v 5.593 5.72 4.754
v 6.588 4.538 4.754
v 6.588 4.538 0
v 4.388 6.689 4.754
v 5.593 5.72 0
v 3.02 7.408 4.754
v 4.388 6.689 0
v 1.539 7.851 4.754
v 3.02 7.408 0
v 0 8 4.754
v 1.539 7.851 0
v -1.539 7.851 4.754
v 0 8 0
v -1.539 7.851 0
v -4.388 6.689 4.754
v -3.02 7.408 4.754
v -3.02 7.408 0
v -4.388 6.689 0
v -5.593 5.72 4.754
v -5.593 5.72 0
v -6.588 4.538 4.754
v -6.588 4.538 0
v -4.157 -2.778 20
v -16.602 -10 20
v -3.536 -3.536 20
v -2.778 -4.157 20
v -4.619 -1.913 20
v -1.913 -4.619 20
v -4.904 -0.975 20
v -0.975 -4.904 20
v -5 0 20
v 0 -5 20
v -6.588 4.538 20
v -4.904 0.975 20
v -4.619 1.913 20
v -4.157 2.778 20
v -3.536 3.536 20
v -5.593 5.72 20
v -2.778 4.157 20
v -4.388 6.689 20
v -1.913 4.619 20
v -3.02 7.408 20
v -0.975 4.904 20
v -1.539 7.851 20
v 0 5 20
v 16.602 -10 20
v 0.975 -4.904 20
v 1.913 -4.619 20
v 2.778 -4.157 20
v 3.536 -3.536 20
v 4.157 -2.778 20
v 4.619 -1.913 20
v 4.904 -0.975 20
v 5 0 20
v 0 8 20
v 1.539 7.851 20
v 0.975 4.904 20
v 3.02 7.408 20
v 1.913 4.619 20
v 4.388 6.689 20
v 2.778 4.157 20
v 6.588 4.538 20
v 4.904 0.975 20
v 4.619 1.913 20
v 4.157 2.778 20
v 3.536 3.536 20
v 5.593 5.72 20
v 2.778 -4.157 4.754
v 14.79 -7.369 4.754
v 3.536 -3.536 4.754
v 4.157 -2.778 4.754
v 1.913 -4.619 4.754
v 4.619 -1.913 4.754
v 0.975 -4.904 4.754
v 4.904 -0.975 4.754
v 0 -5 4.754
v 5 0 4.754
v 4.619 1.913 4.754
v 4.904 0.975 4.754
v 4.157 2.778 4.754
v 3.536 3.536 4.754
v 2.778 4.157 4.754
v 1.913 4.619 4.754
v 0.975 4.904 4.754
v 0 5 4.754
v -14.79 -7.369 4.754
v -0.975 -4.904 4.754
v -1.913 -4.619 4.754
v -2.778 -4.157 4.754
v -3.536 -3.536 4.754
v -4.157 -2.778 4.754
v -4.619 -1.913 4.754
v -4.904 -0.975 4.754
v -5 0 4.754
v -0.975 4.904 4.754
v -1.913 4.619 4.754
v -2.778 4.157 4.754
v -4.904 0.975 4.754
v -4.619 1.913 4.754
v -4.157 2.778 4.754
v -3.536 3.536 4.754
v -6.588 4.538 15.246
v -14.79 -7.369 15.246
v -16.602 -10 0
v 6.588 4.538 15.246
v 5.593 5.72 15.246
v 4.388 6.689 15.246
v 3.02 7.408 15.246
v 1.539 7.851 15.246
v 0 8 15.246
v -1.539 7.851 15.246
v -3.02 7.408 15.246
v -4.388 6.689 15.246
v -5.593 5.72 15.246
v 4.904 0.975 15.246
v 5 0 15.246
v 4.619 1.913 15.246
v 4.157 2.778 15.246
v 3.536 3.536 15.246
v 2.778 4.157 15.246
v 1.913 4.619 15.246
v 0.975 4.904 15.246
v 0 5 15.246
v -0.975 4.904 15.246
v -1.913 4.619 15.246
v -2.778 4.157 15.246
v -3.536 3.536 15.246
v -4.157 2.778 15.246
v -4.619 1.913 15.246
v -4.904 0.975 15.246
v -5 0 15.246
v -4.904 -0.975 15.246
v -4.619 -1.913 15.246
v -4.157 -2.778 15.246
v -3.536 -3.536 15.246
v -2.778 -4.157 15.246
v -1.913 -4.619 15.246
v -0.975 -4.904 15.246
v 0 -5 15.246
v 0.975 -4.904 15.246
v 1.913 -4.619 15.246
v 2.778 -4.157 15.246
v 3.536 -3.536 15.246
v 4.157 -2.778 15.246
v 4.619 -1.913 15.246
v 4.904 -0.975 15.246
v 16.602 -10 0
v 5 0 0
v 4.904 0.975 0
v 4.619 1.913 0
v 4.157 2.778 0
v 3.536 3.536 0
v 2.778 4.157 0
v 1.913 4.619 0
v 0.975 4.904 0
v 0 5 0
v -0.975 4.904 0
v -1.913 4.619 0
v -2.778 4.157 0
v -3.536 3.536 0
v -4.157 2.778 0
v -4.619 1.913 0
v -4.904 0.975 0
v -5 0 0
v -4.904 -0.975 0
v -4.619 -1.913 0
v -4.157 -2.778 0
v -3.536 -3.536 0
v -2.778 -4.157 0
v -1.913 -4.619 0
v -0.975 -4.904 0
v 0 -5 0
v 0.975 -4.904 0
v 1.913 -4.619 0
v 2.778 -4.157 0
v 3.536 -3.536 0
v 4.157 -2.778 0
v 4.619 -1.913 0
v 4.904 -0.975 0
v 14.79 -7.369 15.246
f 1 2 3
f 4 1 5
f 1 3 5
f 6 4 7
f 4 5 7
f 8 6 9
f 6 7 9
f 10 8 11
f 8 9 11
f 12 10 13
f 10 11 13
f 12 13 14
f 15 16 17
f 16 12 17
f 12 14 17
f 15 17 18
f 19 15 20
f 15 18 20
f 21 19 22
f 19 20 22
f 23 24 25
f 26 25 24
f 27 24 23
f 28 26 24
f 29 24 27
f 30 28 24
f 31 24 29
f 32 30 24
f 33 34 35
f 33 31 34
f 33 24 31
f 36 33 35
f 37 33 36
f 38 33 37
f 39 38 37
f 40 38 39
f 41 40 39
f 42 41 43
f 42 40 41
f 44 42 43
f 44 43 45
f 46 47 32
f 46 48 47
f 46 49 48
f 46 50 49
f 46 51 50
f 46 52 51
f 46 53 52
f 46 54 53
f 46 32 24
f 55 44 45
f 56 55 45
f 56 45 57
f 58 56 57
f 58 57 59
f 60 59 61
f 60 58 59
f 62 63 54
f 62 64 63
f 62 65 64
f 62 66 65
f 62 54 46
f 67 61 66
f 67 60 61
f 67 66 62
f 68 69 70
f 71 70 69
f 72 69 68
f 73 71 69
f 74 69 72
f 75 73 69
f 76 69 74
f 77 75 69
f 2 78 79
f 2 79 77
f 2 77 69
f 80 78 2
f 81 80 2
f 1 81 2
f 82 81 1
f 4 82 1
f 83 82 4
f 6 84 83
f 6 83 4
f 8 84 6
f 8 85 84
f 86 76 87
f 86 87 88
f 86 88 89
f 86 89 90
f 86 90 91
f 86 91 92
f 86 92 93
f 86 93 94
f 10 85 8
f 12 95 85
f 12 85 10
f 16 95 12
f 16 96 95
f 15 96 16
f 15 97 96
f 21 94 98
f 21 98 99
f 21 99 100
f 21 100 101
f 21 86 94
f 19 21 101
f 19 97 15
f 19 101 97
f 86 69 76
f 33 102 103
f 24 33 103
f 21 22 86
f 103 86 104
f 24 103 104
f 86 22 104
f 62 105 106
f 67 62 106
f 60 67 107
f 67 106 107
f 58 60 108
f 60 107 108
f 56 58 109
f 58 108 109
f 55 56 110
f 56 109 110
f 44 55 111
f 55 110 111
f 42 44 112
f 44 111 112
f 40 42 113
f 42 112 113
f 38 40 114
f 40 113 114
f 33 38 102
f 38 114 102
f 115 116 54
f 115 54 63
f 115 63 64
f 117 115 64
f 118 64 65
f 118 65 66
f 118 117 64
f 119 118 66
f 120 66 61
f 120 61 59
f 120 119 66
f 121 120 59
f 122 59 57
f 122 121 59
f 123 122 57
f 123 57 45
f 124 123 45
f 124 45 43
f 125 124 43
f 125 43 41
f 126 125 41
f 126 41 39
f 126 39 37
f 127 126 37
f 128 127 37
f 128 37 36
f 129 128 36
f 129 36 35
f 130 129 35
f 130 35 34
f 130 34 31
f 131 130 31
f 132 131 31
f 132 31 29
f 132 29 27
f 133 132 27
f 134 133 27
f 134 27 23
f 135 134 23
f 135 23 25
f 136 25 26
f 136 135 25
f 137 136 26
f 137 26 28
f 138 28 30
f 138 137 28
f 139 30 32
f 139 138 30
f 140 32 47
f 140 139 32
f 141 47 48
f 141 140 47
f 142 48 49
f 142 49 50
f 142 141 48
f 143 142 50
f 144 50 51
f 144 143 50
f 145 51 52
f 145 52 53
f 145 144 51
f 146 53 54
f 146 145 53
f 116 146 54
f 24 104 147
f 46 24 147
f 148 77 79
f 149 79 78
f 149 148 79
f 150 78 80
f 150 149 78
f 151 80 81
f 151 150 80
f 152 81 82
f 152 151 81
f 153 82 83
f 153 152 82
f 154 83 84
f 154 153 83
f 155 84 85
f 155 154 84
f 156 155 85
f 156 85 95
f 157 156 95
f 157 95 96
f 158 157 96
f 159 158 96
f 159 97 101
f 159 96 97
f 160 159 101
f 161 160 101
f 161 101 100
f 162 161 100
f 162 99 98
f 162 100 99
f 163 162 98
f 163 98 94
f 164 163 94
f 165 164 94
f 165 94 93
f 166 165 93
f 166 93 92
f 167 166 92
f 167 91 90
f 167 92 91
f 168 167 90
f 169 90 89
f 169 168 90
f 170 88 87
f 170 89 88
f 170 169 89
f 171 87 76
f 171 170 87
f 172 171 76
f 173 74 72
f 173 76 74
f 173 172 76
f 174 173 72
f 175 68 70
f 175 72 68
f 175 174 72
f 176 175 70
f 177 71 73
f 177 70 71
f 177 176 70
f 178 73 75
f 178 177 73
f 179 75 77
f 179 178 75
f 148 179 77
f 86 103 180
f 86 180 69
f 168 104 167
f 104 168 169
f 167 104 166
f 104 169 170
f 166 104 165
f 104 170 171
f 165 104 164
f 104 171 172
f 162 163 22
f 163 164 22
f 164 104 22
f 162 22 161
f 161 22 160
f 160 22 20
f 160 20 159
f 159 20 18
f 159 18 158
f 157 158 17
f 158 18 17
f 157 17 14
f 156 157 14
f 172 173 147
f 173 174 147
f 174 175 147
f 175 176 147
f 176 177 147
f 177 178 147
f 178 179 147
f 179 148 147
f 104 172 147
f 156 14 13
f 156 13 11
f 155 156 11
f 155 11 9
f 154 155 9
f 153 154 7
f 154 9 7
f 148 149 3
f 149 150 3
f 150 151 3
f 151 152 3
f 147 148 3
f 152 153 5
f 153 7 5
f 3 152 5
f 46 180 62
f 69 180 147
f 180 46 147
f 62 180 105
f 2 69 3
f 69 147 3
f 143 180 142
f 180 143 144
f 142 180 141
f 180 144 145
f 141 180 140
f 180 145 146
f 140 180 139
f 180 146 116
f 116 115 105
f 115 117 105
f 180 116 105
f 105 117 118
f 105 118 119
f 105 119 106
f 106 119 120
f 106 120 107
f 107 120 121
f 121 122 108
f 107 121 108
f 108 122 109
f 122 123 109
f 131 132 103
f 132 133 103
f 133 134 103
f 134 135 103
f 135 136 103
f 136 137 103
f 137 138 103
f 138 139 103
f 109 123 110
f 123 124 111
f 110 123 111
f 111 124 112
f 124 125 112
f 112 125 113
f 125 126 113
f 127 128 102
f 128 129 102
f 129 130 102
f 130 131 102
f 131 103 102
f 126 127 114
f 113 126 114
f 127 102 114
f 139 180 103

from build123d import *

# Parameters (mm, degrees)
SKETCH1_R               = 5
BOSS_EXTRUDE1_DEPTH     = 20
SKETCH2_W               = 10.491339254
SKETCH2_H               = 19.291026948
CUT_EXTRUDE1_DEPTH      = 17.60180745
CUT_EXTRUDE1_DEPTH_BACK = 17.60180745


with BuildPart() as part:
    # Sketch1 → Boss-Extrude1 (new body)
    with BuildSketch(Plane.XY):
        with BuildLine():
            Line((16.60180745, -10), (6.588404709, 4.537942638))
            ThreePointArc((6.588404709, 4.537942638), (0, 8), (-6.588404709, 4.537942638))
            Line((-6.588404709, 4.537942638), (-16.60180745, -10))
            Line((-16.60180745, -10), (16.60180745, -10))
        make_face()
        Circle(SKETCH1_R, mode=Mode.SUBTRACT)
    extrude(amount=BOSS_EXTRUDE1_DEPTH)

    # Sketch2 → Cut-Extrude1 (cut, two sides)
    with BuildSketch(Plane(origin=(0, 0, 0), x_dir=(0, 0, -1), z_dir=(1, 0, 0))) as cut_extrude1_sk:
        with Locations((-10, 2.276563947)):
            Rectangle(SKETCH2_W, SKETCH2_H)
    extrude(amount=CUT_EXTRUDE1_DEPTH, mode=Mode.SUBTRACT)
    extrude(cut_extrude1_sk.sketch, amount=-CUT_EXTRUDE1_DEPTH_BACK, mode=Mode.SUBTRACT)


solid = part.part
